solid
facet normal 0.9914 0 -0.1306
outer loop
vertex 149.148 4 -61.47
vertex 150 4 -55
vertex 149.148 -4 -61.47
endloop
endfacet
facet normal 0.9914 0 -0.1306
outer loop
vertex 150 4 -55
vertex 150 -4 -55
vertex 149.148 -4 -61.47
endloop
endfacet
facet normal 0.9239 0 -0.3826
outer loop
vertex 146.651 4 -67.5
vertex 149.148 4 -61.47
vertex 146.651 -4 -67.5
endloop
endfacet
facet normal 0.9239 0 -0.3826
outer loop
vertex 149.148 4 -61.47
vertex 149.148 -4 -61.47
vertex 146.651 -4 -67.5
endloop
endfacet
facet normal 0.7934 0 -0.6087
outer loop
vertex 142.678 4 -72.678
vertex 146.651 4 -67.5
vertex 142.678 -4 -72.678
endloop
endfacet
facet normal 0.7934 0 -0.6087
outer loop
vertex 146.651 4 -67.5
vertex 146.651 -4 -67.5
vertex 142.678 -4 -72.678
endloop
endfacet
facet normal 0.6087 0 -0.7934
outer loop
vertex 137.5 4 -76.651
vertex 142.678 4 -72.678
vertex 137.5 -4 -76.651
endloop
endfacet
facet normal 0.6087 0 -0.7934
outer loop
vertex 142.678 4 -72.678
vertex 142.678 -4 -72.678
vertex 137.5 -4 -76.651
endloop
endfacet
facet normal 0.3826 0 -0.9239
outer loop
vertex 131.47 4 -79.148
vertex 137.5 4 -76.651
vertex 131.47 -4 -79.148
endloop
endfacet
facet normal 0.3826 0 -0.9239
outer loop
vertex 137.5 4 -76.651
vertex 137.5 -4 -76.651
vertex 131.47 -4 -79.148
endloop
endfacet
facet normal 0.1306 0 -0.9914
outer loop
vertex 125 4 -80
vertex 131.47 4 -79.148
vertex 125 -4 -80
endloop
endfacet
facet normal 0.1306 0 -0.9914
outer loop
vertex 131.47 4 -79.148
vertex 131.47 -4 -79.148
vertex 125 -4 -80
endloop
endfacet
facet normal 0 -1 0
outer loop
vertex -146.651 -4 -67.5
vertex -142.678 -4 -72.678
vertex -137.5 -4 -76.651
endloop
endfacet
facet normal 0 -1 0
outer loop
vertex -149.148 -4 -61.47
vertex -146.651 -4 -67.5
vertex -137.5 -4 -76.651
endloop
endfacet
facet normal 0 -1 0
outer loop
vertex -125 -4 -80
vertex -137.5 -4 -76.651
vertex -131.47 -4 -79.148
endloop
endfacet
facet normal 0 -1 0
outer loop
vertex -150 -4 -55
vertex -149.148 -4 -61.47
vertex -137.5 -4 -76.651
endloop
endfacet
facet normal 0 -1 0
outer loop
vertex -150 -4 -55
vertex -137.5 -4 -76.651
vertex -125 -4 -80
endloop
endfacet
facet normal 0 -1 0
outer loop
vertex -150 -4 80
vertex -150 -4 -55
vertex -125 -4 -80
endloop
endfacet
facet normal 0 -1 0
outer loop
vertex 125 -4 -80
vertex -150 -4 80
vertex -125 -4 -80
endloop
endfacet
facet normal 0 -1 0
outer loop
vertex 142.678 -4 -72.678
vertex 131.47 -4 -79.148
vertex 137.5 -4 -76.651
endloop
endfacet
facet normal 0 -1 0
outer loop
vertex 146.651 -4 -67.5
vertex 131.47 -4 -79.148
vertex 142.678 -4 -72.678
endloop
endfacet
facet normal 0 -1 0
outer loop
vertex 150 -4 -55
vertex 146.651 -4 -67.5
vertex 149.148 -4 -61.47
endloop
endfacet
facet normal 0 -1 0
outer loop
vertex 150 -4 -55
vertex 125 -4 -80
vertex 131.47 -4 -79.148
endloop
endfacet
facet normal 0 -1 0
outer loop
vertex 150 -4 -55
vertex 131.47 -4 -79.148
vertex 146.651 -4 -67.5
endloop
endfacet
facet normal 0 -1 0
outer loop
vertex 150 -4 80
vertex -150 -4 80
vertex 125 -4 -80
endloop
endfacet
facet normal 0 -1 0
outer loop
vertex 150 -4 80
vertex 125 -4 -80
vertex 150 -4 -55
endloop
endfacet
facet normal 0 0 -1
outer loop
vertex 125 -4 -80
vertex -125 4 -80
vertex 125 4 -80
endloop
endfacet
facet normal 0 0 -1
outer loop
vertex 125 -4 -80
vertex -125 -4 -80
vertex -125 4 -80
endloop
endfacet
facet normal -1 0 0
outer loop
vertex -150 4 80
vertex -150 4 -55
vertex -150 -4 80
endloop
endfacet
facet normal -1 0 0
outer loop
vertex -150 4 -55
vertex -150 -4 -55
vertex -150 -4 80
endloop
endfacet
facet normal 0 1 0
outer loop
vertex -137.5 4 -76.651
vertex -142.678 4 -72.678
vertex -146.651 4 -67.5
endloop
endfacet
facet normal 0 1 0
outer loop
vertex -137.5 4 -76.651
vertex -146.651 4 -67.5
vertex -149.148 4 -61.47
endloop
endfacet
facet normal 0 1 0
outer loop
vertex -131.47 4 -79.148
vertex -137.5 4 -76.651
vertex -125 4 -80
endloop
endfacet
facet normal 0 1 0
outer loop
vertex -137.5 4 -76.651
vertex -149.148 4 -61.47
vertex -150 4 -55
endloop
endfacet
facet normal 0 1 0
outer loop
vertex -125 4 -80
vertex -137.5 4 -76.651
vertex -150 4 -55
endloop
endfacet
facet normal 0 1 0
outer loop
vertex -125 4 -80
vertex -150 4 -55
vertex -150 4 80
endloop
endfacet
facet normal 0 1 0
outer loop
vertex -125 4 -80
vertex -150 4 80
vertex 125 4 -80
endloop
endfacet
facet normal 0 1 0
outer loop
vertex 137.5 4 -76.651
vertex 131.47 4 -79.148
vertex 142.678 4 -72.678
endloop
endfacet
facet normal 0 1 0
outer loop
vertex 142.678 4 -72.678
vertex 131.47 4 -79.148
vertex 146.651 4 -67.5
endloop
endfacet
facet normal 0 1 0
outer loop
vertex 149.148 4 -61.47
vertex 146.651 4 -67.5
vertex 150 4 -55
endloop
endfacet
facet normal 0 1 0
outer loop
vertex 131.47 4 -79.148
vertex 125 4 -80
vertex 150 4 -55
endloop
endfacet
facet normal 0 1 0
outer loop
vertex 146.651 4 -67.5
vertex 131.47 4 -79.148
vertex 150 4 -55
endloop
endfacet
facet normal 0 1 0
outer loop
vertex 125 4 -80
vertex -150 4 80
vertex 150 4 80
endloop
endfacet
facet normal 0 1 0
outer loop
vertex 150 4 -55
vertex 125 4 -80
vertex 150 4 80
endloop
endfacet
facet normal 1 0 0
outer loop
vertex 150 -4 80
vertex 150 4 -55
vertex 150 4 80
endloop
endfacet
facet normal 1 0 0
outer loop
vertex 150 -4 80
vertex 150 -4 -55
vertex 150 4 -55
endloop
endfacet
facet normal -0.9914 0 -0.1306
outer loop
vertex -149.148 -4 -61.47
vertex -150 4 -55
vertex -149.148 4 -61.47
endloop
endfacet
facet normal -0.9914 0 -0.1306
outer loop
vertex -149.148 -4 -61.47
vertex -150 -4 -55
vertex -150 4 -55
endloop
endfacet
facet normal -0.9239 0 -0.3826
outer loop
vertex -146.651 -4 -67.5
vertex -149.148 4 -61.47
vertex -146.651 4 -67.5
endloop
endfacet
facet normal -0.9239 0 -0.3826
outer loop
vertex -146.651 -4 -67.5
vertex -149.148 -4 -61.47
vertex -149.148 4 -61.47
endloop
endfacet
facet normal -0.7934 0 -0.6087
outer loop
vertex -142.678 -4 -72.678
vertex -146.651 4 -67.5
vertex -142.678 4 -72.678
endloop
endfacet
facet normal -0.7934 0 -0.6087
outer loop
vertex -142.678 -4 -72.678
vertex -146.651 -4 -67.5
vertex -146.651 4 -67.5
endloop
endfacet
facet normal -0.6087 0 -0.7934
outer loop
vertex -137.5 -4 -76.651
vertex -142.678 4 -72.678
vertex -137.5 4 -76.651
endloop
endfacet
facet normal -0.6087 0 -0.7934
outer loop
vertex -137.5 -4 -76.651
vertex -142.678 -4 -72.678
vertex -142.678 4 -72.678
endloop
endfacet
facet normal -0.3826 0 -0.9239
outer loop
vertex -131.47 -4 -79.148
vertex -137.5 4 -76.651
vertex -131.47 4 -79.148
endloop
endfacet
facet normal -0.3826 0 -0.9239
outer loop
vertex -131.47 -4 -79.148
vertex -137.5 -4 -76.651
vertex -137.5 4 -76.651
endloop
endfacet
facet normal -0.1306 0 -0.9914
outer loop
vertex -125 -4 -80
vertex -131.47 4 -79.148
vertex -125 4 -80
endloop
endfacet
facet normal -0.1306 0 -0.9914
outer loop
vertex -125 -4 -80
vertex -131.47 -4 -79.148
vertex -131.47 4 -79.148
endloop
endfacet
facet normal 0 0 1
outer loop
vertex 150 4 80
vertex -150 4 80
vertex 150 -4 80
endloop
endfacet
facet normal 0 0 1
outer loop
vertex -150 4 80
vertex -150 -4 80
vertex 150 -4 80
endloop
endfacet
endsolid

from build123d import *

# Parameters (mm, degrees)
F0_W     = 300
F0_H     = 160
F1_DEPTH = 4
F2_R     = 25


with BuildPart() as f1:
    # F0 (on Front) → F1 (new body, symmetric)
    with BuildSketch(Plane.XZ):
        Rectangle(F0_W, F0_H)
    extrude(amount=F1_DEPTH, both=True)

    # F2
    f2_edges = [f1.edges().sort_by_distance(p)[0] for p in [
        (150, 0, -80),
        (-150, 0, -80),
    ]]
    fillet(f2_edges, radius=F2_R)


solid = f1.part
